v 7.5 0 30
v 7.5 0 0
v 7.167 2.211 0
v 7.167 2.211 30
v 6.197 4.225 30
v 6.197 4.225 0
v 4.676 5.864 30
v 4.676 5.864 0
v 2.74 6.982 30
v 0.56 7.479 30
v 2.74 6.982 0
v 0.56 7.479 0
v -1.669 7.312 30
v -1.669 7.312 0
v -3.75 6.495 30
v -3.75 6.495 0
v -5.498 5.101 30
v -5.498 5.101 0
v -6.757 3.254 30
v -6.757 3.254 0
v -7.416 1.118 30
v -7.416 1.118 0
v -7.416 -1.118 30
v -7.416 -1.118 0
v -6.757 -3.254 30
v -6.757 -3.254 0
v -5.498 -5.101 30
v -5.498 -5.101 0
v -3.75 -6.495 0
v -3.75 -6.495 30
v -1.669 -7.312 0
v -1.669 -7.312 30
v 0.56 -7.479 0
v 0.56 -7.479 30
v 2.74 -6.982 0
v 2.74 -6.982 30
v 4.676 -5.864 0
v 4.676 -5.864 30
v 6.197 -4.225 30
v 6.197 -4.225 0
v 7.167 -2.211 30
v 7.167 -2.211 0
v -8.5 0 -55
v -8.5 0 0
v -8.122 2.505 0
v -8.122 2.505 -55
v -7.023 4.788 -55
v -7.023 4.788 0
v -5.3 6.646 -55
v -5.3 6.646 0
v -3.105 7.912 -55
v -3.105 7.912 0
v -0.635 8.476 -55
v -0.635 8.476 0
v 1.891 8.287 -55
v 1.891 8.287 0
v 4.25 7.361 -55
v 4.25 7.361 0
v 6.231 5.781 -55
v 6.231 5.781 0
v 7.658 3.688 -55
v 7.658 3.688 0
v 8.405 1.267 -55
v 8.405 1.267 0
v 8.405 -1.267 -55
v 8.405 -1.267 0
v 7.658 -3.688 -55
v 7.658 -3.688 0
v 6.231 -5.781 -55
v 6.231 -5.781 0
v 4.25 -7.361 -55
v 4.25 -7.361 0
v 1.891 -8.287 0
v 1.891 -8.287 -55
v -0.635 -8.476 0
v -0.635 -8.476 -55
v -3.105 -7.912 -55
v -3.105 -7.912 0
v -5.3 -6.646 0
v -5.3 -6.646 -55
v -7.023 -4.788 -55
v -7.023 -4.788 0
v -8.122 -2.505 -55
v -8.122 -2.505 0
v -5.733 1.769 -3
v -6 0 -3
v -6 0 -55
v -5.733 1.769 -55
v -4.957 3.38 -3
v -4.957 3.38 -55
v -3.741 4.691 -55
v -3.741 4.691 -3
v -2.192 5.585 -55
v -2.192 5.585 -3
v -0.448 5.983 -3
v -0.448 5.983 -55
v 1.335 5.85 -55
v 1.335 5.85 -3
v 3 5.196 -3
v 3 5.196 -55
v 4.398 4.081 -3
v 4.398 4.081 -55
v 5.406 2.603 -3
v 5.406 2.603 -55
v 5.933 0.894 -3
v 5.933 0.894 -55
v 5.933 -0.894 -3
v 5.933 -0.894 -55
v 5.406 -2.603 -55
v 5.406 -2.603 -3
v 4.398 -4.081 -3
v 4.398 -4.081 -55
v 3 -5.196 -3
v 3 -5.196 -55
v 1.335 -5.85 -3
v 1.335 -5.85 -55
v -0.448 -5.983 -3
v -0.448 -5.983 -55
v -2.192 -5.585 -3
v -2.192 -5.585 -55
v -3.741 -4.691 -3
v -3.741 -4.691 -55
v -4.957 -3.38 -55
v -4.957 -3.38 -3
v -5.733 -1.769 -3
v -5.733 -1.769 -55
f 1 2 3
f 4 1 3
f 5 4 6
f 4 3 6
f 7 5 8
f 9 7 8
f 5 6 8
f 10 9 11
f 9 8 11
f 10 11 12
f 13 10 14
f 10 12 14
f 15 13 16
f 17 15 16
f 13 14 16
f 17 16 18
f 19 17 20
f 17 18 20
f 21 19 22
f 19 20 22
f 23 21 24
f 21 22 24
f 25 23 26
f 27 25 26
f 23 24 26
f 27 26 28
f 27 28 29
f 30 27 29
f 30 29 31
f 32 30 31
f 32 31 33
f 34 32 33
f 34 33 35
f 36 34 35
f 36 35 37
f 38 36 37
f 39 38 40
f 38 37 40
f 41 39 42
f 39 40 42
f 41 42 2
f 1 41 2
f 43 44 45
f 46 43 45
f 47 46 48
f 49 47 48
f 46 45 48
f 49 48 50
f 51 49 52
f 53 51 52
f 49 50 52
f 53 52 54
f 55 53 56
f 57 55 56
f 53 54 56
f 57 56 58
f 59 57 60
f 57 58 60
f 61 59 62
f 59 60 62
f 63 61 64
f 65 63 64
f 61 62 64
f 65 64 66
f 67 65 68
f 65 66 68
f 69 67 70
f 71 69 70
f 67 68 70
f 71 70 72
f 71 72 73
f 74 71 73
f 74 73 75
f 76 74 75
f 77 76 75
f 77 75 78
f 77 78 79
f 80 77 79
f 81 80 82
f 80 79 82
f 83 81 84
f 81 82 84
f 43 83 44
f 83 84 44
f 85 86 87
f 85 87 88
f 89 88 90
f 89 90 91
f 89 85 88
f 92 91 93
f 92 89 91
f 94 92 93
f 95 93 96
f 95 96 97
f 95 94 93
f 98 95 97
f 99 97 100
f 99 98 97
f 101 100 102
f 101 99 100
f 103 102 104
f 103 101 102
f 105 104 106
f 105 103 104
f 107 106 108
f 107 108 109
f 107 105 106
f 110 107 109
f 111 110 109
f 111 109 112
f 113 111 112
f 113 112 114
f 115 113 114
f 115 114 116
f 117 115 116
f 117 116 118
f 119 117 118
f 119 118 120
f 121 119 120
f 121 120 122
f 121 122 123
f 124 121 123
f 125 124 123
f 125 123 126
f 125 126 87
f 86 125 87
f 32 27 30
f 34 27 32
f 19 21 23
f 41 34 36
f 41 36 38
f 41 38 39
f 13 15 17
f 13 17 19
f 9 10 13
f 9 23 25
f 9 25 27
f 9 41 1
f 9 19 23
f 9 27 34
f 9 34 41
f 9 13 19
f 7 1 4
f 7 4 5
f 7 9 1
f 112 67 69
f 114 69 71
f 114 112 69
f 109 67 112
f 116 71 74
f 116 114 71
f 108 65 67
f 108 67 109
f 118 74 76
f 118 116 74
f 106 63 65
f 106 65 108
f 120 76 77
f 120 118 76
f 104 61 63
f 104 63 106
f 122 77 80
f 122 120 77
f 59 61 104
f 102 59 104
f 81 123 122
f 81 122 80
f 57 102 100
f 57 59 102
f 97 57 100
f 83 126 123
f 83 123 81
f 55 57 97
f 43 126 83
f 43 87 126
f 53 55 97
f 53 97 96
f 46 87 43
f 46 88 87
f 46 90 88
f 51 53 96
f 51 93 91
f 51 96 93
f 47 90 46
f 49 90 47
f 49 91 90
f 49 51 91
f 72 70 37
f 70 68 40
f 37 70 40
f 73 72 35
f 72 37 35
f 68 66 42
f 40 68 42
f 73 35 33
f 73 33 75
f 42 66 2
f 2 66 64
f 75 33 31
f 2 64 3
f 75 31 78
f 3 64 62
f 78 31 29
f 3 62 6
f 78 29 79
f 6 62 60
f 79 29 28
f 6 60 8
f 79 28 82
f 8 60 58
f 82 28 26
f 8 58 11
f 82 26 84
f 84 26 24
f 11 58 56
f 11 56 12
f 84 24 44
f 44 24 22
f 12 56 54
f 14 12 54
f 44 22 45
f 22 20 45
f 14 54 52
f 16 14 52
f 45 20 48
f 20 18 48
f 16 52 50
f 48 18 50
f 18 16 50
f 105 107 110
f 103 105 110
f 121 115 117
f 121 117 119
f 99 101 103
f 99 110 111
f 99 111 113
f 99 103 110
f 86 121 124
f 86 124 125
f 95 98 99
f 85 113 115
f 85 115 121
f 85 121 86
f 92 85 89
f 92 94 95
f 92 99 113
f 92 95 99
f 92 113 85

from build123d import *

# Parameters (mm, degrees)
SKETCH1_R           = 7.5
BOSS_EXTRUDE1_DEPTH = 30
SKETCH2_R           = 8.5
SKETCH2_R_2         = 6
BOSS_EXTRUDE2_DEPTH = 55
SKETCH3_R           = 6
BOSS_EXTRUDE3_DEPTH = 3


with BuildPart() as part:
    # Sketch1 → Boss-Extrude1 (new body)
    with BuildSketch(Plane.XY):
        Circle(SKETCH1_R)
    extrude(amount=BOSS_EXTRUDE1_DEPTH)

    # Sketch2 → Boss-Extrude2 (add)
    with BuildSketch(Plane(origin=(0, 0, 0), x_dir=(-1, 0, 0), z_dir=(0, 0, -1))):
        Circle(SKETCH2_R)
        Circle(SKETCH2_R_2, mode=Mode.SUBTRACT)
    extrude(amount=BOSS_EXTRUDE2_DEPTH)

    # Sketch3 → Boss-Extrude3 (add)
    with BuildSketch(Plane(origin=(0, 0, 0), x_dir=(-1, 0, 0), z_dir=(0, 0, -1))):
        Circle(SKETCH3_R)
    extrude(amount=BOSS_EXTRUDE3_DEPTH)


solid = part.part
